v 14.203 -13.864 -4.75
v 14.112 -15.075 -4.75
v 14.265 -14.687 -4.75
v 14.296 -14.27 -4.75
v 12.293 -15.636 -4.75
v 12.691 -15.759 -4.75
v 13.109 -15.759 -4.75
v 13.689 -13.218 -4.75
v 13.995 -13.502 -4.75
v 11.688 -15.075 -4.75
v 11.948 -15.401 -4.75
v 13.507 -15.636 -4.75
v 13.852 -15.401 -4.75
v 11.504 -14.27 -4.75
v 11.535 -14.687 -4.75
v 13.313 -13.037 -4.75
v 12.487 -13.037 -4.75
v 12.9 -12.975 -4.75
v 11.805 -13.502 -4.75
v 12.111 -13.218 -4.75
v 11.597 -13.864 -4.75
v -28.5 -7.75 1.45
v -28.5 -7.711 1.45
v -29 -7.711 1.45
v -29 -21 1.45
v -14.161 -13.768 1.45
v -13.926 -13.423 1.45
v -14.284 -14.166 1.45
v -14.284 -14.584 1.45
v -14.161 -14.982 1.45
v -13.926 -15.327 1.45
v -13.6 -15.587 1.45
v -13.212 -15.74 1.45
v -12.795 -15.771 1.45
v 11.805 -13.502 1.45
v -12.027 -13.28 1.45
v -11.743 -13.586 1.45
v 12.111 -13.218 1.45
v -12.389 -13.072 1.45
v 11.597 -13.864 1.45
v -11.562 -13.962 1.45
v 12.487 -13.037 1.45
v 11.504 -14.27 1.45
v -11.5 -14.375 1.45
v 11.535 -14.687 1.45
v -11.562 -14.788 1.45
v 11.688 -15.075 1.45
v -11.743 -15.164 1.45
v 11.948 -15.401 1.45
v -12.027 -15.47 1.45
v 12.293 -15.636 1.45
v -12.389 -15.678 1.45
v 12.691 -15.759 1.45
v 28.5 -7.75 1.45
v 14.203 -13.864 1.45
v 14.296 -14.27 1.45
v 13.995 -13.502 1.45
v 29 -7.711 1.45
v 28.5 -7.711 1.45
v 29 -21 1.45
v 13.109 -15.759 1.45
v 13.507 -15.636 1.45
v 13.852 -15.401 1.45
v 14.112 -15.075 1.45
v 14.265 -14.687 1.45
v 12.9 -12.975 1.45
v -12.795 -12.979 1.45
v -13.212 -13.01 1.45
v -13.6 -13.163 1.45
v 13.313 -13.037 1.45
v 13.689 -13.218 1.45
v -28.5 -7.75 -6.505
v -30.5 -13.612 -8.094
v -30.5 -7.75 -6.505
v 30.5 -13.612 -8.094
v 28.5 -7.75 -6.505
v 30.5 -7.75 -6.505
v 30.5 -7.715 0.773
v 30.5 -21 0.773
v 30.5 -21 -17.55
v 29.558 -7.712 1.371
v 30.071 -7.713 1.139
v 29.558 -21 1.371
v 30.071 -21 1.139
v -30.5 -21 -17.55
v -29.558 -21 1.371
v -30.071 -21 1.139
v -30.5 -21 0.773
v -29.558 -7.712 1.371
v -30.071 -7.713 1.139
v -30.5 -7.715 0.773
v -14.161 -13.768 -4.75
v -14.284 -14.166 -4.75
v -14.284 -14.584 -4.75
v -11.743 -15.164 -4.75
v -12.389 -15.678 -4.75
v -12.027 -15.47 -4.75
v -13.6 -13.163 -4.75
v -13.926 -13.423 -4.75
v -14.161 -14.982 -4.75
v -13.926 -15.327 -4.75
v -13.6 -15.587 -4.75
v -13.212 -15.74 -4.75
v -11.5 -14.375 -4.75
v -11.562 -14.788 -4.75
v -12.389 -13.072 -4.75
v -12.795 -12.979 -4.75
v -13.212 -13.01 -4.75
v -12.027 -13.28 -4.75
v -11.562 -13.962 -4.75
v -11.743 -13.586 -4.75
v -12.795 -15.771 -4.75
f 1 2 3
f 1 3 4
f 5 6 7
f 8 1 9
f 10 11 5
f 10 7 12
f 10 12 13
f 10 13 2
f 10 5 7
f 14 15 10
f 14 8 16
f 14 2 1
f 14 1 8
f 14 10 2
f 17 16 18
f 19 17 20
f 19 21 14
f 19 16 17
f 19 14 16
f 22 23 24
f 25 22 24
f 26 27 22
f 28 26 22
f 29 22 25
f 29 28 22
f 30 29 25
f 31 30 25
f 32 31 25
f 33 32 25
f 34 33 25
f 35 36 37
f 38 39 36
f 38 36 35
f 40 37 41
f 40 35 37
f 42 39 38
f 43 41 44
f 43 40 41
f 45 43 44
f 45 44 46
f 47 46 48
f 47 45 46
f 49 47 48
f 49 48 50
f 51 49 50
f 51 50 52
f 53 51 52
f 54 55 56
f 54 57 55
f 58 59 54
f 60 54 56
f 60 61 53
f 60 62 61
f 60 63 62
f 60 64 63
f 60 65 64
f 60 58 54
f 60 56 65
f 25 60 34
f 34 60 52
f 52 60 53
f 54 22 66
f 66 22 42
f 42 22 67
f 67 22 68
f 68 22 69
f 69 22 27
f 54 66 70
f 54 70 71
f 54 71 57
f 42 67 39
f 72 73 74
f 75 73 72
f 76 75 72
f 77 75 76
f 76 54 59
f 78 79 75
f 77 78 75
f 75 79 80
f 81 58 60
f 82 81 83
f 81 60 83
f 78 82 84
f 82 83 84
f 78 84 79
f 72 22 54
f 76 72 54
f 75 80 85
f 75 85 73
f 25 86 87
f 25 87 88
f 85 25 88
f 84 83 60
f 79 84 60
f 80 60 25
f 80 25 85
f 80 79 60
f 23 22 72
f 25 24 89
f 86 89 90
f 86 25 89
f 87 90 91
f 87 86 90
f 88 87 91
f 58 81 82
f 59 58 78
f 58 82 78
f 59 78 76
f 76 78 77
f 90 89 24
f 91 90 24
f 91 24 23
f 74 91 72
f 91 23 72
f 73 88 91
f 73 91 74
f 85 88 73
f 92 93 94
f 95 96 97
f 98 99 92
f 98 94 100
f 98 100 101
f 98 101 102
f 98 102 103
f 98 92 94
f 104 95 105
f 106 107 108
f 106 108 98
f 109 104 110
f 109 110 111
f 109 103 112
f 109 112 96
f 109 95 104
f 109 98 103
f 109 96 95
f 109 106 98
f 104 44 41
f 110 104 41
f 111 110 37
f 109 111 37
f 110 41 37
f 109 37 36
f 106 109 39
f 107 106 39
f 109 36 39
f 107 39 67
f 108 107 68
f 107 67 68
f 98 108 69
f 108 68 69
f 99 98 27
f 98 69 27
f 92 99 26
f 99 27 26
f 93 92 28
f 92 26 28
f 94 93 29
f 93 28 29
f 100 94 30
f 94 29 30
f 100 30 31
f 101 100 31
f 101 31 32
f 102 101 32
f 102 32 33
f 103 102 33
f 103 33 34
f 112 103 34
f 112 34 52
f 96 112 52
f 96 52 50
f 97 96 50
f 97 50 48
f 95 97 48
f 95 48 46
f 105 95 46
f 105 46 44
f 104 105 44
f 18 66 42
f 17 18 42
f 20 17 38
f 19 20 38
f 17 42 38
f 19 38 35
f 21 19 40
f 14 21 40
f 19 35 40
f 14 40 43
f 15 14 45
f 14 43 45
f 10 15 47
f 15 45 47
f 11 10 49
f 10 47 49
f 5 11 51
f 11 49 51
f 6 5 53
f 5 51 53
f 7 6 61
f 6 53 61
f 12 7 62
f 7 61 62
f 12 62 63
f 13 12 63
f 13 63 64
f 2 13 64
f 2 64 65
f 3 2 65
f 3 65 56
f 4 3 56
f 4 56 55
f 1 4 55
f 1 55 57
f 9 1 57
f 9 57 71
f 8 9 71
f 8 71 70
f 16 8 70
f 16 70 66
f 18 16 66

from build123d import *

# Parameters (mm, degrees)
SKETCH1_R               = 2.15
BOSS_EXTRUDE1_DEPTH     = 31
CUT_EXTRUDE1_REACH      = 45.327
SKETCH2_W               = 57
SKETCH2_H               = 12
SKETCH7_R               = 1.4
CUT_EXTRUDE2_DEPTH      = 9
CUT_EXTRUDE3_DEPTH      = 68.771693944
FILLET1_R               = 2
CUT_EXTRUDE4_DEPTH      = 39.007433483
CUT_EXTRUDE4_DEPTH_BACK = 39.007433483
SKETCH9_W               = 62
SKETCH9_H               = 45.1
SKETCH9_W_2             = 61
SKETCH9_H_2             = 43.1


with BuildPart() as part:
    # Sketch1 → Boss-Extrude1 (new, symmetric)
    with BuildSketch(Plane(origin=(0, 0, 0), x_dir=(0, 0, -1), z_dir=(1, 0, 0))):
        with BuildLine():
            Line((-4.25, 0), (-4.25, -4))
            ThreePointArc((-4.25, -4), (-4.105356672, -4.642657212), (-3.699322277, -5.161372987))
            Line((-3.699322277, -5.161372987), (-2.000677723, -6.549868444))
            ThreePointArc((-2.000677723, -6.549868444), (-1.594643328, -7.068584218), (-1.45, -7.71124143))
            Line((-1.45, -7.71124143), (-1.45, -21))
            Line((-1.45, -21), (17.55, -21))
            Line((17.55, -21), (8.093870957, -13.612062296))
            Line((8.093870957, -13.612062296), (4.101919606, 1.112095114))
            ThreePointArc((4.101919606, 1.112095114), (-0.560955289, 4.212817248), (-4.25, 0))
        make_face()
        Circle(SKETCH1_R, mode=Mode.SUBTRACT)
    extrude(amount=BOSS_EXTRUDE1_DEPTH, both=True)

    # Cut-Extrude1: up to this plane
    cut_extrude1_end = Plane(origin=(31, -13.612062296, -8.093870957), z_dir=(0, -0.26166943856052705, 0.9651575544559649))
    # Sketch2 → Cut-Extrude1 (cut, up to the surface)
    with BuildSketch(Plane.XY.offset(4.25), mode=Mode.PRIVATE) as cut_extrude1_sk1:
        with Locations((0, -1.75)):
            Rectangle(SKETCH2_W, SKETCH2_H)
    cut_extrude1_tool1 = split(extrude(cut_extrude1_sk1.sketch, amount=-CUT_EXTRUDE1_REACH, mode=Mode.PRIVATE), bisect_by=cut_extrude1_end, keep=Keep.BOTH, mode=Mode.PRIVATE)
    add(cut_extrude1_tool1.solids().sort_by_distance((0, -1.75, 4.25))[0], mode=Mode.SUBTRACT)

    # Sketch7 → Cut-Extrude2 (cut)
    with BuildSketch(Plane.XY.offset(4.25)):
        with Locations((-12.9, -14.375)):
            Circle(SKETCH7_R)
        with Locations(Location((12.9, -14.375, 0), (0, 0, 90))):
            Circle(SKETCH7_R)
    extrude(amount=-CUT_EXTRUDE2_DEPTH, mode=Mode.SUBTRACT)

    # Sketch8 → Cut-Extrude3 (cut, through all)
    with BuildSketch(Plane(origin=(31, 0, 0), x_dir=(0, 0, -1), z_dir=(1, 0, 0))):
        with BuildLine():
            Line((-1.45, -7.71124143), (6.504573393, -7.75))
            Line((6.504573393, -7.75), (4.101919606, 1.112095114))
            ThreePointArc((4.101919606, 1.112095114), (-0.560955289, 4.212817248), (-4.25, 0))
            Line((-4.25, 0), (-4.25, -4))
            ThreePointArc((-4.25, -4), (-4.105356672, -4.642657212), (-3.699322277, -5.161372987))
            Line((-3.699322277, -5.161372987), (-2.000677723, -6.549868444))
            ThreePointArc((-2.000677723, -6.549868444), (-1.594643328, -7.068584218), (-1.45, -7.71124143))
        make_face()
    extrude(amount=-CUT_EXTRUDE3_DEPTH, mode=Mode.SUBTRACT)

    # Fillet1
    fillet1_edges = [part.edges().sort_by_distance(p)[0] for p in [
        (31, -14.355620715, 1.45),
        (-31, -14.355620715, 1.45),
    ]]
    fillet(fillet1_edges, radius=FILLET1_R)

    # Sketch9 → Cut-Extrude4 (cut, two sides: drawn at the far end of the back side and taken through both)
    with BuildSketch(Plane(origin=(0, -7.75, 0), x_dir=(1, 0, 0), z_dir=(0, 1, 0)).offset(-CUT_EXTRUDE4_DEPTH_BACK)):
        Rectangle(SKETCH9_W, SKETCH9_H)
        Rectangle(SKETCH9_W_2, SKETCH9_H_2, mode=Mode.SUBTRACT)
    extrude(amount=CUT_EXTRUDE4_DEPTH + CUT_EXTRUDE4_DEPTH_BACK, mode=Mode.SUBTRACT)


solid = part.part
